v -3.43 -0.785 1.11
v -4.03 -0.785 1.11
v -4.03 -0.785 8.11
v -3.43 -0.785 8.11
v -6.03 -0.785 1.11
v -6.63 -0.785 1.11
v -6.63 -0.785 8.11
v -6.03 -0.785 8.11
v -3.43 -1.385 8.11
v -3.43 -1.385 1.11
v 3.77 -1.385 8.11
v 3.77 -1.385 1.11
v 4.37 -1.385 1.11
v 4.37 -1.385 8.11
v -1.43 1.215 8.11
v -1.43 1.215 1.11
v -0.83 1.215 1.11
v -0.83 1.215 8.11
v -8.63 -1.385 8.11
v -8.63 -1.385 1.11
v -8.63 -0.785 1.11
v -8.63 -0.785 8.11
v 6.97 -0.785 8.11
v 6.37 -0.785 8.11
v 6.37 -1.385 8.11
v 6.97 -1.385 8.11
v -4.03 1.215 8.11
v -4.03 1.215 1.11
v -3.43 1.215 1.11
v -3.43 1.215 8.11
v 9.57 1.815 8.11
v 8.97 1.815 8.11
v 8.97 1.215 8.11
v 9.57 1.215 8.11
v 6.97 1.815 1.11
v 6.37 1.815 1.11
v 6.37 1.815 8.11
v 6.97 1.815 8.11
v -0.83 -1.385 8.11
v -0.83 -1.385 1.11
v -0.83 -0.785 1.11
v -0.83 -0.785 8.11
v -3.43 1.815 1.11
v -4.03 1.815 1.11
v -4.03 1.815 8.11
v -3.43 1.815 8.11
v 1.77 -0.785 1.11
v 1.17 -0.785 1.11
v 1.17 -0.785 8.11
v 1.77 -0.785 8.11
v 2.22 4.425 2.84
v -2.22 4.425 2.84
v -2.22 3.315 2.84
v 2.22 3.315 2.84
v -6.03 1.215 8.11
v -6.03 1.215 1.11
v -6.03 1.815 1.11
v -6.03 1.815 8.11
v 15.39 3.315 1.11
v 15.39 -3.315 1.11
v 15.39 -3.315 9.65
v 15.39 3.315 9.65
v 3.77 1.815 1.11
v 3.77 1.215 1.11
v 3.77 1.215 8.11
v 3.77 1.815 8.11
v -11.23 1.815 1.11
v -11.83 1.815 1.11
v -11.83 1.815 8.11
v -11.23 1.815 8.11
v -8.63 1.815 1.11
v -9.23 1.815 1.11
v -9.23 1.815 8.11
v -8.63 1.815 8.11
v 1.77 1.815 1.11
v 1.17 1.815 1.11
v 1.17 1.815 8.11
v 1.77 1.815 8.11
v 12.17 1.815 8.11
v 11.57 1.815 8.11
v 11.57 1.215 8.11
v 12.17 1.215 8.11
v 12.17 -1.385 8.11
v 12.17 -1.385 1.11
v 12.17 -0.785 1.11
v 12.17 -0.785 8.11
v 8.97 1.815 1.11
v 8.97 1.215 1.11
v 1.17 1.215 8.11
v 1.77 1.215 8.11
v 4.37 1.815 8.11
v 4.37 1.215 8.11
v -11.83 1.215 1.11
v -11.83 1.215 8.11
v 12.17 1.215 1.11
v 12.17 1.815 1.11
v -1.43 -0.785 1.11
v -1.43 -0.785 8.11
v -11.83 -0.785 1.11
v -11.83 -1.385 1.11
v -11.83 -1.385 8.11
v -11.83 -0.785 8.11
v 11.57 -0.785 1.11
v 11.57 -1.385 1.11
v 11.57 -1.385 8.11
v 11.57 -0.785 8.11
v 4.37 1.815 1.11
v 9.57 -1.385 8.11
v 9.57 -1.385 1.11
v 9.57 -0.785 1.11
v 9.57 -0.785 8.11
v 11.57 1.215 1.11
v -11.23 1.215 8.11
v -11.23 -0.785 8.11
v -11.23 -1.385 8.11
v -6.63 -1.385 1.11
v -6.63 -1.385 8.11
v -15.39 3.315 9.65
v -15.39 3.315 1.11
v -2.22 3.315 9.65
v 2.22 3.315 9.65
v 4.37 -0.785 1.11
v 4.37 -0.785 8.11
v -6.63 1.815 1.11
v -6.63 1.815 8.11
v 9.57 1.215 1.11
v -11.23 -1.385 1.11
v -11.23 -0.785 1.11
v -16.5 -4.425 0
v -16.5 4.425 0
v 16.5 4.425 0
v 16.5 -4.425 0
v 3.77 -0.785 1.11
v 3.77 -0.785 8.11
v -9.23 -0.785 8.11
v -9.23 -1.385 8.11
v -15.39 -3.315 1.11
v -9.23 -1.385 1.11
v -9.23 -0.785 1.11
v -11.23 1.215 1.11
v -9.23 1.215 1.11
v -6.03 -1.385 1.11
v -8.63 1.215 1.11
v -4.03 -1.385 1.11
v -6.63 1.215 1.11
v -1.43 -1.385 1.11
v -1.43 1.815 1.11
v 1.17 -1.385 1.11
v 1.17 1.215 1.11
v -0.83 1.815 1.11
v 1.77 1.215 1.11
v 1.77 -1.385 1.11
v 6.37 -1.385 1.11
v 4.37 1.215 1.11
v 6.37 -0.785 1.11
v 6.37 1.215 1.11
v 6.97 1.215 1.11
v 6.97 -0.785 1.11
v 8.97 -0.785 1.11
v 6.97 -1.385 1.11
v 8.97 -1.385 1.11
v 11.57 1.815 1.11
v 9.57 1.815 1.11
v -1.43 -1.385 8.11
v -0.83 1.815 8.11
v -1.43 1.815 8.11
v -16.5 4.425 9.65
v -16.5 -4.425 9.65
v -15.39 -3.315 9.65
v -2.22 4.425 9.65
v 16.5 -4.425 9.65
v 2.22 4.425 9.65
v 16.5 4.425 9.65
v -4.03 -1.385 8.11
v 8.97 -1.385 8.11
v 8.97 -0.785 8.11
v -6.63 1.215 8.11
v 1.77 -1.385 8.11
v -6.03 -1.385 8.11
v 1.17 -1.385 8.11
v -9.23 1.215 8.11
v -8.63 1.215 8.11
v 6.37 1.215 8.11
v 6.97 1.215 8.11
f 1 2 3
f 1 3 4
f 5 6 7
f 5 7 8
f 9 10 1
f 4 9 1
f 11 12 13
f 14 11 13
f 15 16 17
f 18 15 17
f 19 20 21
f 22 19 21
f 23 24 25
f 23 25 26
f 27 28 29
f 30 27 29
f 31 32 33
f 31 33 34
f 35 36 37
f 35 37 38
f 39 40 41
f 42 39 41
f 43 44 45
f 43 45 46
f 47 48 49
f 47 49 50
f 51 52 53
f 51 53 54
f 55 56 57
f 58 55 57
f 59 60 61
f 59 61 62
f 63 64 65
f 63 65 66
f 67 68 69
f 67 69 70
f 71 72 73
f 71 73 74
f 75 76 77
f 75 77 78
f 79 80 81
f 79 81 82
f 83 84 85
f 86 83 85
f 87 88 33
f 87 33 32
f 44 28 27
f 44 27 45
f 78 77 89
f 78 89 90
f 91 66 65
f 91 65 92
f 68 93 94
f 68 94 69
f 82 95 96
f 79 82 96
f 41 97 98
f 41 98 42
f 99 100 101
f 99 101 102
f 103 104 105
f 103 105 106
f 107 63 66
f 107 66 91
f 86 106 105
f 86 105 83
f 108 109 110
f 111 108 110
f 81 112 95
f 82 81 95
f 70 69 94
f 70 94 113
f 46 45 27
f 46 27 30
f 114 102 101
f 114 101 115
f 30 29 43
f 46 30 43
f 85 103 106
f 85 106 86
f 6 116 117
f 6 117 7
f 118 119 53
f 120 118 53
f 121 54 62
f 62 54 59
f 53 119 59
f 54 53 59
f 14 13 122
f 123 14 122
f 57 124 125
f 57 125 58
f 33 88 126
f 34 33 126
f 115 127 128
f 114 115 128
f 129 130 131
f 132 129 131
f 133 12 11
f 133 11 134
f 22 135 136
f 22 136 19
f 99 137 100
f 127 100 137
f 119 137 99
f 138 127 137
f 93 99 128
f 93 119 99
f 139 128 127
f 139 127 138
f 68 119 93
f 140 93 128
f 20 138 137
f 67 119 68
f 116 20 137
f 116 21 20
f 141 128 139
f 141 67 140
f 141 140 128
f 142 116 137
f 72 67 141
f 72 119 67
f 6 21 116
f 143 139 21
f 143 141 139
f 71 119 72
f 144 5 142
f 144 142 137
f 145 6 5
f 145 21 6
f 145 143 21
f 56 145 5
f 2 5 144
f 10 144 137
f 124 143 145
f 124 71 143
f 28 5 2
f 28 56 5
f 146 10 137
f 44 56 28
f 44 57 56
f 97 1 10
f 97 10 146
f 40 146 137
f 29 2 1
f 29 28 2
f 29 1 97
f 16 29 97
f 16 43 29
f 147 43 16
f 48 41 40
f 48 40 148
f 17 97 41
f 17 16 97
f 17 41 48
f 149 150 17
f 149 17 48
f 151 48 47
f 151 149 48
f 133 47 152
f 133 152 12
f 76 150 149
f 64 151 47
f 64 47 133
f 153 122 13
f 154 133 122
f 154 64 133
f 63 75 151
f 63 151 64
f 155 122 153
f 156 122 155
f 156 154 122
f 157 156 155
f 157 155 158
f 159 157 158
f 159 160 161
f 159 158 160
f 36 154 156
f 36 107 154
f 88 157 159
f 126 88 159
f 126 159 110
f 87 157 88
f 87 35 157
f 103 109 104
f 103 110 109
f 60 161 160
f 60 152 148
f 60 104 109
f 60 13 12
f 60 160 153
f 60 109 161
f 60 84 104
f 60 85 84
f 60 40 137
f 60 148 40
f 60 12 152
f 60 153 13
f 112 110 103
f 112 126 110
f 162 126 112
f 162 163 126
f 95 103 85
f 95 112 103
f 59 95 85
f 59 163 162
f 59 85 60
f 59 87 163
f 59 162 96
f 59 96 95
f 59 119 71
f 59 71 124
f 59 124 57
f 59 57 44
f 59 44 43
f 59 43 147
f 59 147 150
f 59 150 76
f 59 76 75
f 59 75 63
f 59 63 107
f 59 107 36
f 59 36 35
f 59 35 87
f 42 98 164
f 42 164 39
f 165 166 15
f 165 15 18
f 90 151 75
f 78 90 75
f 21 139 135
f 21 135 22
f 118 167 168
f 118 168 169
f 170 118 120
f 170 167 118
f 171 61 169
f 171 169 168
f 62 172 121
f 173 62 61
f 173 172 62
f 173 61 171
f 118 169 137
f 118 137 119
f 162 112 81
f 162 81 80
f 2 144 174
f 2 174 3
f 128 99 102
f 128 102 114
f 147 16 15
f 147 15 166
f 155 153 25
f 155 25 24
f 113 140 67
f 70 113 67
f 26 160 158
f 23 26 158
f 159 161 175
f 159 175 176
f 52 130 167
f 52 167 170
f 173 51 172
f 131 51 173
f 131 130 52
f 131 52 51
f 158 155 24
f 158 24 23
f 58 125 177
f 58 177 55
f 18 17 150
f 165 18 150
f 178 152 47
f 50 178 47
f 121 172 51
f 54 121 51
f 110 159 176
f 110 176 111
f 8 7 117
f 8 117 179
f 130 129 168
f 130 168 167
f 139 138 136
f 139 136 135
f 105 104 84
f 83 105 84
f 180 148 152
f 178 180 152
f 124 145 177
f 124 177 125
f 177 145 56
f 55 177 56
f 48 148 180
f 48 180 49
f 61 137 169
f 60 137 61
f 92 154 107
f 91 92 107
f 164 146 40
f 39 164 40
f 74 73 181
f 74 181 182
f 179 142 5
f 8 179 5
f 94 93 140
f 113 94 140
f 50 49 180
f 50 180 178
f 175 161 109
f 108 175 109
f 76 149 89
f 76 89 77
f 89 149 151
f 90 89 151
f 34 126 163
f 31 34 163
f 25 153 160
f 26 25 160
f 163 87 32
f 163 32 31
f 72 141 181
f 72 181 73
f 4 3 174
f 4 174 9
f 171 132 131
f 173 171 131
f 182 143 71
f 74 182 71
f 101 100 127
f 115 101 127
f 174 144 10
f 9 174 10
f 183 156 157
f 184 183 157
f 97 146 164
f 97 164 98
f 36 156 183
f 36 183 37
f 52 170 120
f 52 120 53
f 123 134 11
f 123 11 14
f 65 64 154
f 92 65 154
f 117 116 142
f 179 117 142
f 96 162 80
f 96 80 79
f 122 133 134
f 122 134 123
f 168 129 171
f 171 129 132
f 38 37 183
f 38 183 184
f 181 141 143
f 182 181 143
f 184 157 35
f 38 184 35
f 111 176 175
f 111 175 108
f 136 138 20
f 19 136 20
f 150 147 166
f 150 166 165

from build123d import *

# Parameters (mm, degrees)
SZKIC1_W                    = 33
SZKIC1_H                    = 8.85
DODANIE_WYCI_GNI_CIE1_DEPTH = 9.65
SKORUPA1_T                  = -1.11
WYTNIJ_WYCI_GNI_CIE1_REACH  = 23.064
SZKIC2_W                    = 4.44
SZKIC2_H                    = 6.81
SZKIC3_W                    = 0.6
SZKIC3_H                    = 0.6
DODANIE_WYCI_GNI_CIE2_DEPTH = 7


with BuildPart() as part:
    # Szkic1 → Dodanie-wyciągnięcie1 (new body)
    with BuildSketch(Plane.XY):
        Rectangle(SZKIC1_W, SZKIC1_H)
    extrude(amount=DODANIE_WYCI_GNI_CIE1_DEPTH)

    # Skorupa1
    skorupa1_openings = [part.faces().sort_by_distance(p)[0] for p in [
        (0, 0, 9.65),
    ]]
    offset(amount=SKORUPA1_T, openings=skorupa1_openings, kind=Kind.INTERSECTION)

    # Szkic2 → Wytnij-wyciągnięcie1 (cut, up to next)
    with BuildSketch(Plane(origin=(0, 4.425, 0), x_dir=(1, 0, 0), z_dir=(0, 1, 0)), mode=Mode.PRIVATE) as wytnij_wyci_gni_cie1_sk1:
        with Locations((0, -6.245)):
            Rectangle(SZKIC2_W, SZKIC2_H)
    wytnij_wyci_gni_cie1_tool1 = extrude(wytnij_wyci_gni_cie1_sk1.sketch, amount=-WYTNIJ_WYCI_GNI_CIE1_REACH, mode=Mode.PRIVATE) & part.part
    add(wytnij_wyci_gni_cie1_tool1.solids().sort_by_distance((0, 4.425, 6.245))[0], mode=Mode.SUBTRACT)

    # Szkic3 → Dodanie-wyciągnięcie2 (add)
    with BuildSketch(Plane.XY.offset(1.11)):
        with Locations((-11.53, 1.515)):
            Rectangle(SZKIC3_W, SZKIC3_H)
        with Locations((-8.93, 1.515)):
            Rectangle(SZKIC3_W, SZKIC3_H)
        with Locations((-6.33, 1.515)):
            Rectangle(SZKIC3_W, SZKIC3_H)
        with Locations((-3.73, 1.515)):
            Rectangle(SZKIC3_W, SZKIC3_H)
        with Locations((-1.13, 1.515)):
            Rectangle(SZKIC3_W, SZKIC3_H)
        with Locations((1.47, 1.515)):
            Rectangle(SZKIC3_W, SZKIC3_H)
        with Locations((4.07, 1.515)):
            Rectangle(SZKIC3_W, SZKIC3_H)
        with Locations((6.67, 1.515)):
            Rectangle(SZKIC3_W, SZKIC3_H)
        with Locations((9.27, 1.515)):
            Rectangle(SZKIC3_W, SZKIC3_H)
        with Locations((11.87, 1.515)):
            Rectangle(SZKIC3_W, SZKIC3_H)
        with Locations((-8.93, -1.085)):
            Rectangle(SZKIC3_W, SZKIC3_H)
        with Locations((-6.33, -1.085)):
            Rectangle(SZKIC3_W, SZKIC3_H)
        with Locations((-3.73, -1.085)):
            Rectangle(SZKIC3_W, SZKIC3_H)
        with Locations((-1.13, -1.085)):
            Rectangle(SZKIC3_W, SZKIC3_H)
        with Locations((1.47, -1.085)):
            Rectangle(SZKIC3_W, SZKIC3_H)
        with Locations((4.07, -1.085)):
            Rectangle(SZKIC3_W, SZKIC3_H)
        with Locations((6.67, -1.085)):
            Rectangle(SZKIC3_W, SZKIC3_H)
        with Locations((9.27, -1.085)):
            Rectangle(SZKIC3_W, SZKIC3_H)
        with Locations((11.87, -1.085)):
            Rectangle(SZKIC3_W, SZKIC3_H)
        with Locations((-11.53, -1.085)):
            Rectangle(SZKIC3_W, SZKIC3_H)
    extrude(amount=DODANIE_WYCI_GNI_CIE2_DEPTH)


solid = part.part
